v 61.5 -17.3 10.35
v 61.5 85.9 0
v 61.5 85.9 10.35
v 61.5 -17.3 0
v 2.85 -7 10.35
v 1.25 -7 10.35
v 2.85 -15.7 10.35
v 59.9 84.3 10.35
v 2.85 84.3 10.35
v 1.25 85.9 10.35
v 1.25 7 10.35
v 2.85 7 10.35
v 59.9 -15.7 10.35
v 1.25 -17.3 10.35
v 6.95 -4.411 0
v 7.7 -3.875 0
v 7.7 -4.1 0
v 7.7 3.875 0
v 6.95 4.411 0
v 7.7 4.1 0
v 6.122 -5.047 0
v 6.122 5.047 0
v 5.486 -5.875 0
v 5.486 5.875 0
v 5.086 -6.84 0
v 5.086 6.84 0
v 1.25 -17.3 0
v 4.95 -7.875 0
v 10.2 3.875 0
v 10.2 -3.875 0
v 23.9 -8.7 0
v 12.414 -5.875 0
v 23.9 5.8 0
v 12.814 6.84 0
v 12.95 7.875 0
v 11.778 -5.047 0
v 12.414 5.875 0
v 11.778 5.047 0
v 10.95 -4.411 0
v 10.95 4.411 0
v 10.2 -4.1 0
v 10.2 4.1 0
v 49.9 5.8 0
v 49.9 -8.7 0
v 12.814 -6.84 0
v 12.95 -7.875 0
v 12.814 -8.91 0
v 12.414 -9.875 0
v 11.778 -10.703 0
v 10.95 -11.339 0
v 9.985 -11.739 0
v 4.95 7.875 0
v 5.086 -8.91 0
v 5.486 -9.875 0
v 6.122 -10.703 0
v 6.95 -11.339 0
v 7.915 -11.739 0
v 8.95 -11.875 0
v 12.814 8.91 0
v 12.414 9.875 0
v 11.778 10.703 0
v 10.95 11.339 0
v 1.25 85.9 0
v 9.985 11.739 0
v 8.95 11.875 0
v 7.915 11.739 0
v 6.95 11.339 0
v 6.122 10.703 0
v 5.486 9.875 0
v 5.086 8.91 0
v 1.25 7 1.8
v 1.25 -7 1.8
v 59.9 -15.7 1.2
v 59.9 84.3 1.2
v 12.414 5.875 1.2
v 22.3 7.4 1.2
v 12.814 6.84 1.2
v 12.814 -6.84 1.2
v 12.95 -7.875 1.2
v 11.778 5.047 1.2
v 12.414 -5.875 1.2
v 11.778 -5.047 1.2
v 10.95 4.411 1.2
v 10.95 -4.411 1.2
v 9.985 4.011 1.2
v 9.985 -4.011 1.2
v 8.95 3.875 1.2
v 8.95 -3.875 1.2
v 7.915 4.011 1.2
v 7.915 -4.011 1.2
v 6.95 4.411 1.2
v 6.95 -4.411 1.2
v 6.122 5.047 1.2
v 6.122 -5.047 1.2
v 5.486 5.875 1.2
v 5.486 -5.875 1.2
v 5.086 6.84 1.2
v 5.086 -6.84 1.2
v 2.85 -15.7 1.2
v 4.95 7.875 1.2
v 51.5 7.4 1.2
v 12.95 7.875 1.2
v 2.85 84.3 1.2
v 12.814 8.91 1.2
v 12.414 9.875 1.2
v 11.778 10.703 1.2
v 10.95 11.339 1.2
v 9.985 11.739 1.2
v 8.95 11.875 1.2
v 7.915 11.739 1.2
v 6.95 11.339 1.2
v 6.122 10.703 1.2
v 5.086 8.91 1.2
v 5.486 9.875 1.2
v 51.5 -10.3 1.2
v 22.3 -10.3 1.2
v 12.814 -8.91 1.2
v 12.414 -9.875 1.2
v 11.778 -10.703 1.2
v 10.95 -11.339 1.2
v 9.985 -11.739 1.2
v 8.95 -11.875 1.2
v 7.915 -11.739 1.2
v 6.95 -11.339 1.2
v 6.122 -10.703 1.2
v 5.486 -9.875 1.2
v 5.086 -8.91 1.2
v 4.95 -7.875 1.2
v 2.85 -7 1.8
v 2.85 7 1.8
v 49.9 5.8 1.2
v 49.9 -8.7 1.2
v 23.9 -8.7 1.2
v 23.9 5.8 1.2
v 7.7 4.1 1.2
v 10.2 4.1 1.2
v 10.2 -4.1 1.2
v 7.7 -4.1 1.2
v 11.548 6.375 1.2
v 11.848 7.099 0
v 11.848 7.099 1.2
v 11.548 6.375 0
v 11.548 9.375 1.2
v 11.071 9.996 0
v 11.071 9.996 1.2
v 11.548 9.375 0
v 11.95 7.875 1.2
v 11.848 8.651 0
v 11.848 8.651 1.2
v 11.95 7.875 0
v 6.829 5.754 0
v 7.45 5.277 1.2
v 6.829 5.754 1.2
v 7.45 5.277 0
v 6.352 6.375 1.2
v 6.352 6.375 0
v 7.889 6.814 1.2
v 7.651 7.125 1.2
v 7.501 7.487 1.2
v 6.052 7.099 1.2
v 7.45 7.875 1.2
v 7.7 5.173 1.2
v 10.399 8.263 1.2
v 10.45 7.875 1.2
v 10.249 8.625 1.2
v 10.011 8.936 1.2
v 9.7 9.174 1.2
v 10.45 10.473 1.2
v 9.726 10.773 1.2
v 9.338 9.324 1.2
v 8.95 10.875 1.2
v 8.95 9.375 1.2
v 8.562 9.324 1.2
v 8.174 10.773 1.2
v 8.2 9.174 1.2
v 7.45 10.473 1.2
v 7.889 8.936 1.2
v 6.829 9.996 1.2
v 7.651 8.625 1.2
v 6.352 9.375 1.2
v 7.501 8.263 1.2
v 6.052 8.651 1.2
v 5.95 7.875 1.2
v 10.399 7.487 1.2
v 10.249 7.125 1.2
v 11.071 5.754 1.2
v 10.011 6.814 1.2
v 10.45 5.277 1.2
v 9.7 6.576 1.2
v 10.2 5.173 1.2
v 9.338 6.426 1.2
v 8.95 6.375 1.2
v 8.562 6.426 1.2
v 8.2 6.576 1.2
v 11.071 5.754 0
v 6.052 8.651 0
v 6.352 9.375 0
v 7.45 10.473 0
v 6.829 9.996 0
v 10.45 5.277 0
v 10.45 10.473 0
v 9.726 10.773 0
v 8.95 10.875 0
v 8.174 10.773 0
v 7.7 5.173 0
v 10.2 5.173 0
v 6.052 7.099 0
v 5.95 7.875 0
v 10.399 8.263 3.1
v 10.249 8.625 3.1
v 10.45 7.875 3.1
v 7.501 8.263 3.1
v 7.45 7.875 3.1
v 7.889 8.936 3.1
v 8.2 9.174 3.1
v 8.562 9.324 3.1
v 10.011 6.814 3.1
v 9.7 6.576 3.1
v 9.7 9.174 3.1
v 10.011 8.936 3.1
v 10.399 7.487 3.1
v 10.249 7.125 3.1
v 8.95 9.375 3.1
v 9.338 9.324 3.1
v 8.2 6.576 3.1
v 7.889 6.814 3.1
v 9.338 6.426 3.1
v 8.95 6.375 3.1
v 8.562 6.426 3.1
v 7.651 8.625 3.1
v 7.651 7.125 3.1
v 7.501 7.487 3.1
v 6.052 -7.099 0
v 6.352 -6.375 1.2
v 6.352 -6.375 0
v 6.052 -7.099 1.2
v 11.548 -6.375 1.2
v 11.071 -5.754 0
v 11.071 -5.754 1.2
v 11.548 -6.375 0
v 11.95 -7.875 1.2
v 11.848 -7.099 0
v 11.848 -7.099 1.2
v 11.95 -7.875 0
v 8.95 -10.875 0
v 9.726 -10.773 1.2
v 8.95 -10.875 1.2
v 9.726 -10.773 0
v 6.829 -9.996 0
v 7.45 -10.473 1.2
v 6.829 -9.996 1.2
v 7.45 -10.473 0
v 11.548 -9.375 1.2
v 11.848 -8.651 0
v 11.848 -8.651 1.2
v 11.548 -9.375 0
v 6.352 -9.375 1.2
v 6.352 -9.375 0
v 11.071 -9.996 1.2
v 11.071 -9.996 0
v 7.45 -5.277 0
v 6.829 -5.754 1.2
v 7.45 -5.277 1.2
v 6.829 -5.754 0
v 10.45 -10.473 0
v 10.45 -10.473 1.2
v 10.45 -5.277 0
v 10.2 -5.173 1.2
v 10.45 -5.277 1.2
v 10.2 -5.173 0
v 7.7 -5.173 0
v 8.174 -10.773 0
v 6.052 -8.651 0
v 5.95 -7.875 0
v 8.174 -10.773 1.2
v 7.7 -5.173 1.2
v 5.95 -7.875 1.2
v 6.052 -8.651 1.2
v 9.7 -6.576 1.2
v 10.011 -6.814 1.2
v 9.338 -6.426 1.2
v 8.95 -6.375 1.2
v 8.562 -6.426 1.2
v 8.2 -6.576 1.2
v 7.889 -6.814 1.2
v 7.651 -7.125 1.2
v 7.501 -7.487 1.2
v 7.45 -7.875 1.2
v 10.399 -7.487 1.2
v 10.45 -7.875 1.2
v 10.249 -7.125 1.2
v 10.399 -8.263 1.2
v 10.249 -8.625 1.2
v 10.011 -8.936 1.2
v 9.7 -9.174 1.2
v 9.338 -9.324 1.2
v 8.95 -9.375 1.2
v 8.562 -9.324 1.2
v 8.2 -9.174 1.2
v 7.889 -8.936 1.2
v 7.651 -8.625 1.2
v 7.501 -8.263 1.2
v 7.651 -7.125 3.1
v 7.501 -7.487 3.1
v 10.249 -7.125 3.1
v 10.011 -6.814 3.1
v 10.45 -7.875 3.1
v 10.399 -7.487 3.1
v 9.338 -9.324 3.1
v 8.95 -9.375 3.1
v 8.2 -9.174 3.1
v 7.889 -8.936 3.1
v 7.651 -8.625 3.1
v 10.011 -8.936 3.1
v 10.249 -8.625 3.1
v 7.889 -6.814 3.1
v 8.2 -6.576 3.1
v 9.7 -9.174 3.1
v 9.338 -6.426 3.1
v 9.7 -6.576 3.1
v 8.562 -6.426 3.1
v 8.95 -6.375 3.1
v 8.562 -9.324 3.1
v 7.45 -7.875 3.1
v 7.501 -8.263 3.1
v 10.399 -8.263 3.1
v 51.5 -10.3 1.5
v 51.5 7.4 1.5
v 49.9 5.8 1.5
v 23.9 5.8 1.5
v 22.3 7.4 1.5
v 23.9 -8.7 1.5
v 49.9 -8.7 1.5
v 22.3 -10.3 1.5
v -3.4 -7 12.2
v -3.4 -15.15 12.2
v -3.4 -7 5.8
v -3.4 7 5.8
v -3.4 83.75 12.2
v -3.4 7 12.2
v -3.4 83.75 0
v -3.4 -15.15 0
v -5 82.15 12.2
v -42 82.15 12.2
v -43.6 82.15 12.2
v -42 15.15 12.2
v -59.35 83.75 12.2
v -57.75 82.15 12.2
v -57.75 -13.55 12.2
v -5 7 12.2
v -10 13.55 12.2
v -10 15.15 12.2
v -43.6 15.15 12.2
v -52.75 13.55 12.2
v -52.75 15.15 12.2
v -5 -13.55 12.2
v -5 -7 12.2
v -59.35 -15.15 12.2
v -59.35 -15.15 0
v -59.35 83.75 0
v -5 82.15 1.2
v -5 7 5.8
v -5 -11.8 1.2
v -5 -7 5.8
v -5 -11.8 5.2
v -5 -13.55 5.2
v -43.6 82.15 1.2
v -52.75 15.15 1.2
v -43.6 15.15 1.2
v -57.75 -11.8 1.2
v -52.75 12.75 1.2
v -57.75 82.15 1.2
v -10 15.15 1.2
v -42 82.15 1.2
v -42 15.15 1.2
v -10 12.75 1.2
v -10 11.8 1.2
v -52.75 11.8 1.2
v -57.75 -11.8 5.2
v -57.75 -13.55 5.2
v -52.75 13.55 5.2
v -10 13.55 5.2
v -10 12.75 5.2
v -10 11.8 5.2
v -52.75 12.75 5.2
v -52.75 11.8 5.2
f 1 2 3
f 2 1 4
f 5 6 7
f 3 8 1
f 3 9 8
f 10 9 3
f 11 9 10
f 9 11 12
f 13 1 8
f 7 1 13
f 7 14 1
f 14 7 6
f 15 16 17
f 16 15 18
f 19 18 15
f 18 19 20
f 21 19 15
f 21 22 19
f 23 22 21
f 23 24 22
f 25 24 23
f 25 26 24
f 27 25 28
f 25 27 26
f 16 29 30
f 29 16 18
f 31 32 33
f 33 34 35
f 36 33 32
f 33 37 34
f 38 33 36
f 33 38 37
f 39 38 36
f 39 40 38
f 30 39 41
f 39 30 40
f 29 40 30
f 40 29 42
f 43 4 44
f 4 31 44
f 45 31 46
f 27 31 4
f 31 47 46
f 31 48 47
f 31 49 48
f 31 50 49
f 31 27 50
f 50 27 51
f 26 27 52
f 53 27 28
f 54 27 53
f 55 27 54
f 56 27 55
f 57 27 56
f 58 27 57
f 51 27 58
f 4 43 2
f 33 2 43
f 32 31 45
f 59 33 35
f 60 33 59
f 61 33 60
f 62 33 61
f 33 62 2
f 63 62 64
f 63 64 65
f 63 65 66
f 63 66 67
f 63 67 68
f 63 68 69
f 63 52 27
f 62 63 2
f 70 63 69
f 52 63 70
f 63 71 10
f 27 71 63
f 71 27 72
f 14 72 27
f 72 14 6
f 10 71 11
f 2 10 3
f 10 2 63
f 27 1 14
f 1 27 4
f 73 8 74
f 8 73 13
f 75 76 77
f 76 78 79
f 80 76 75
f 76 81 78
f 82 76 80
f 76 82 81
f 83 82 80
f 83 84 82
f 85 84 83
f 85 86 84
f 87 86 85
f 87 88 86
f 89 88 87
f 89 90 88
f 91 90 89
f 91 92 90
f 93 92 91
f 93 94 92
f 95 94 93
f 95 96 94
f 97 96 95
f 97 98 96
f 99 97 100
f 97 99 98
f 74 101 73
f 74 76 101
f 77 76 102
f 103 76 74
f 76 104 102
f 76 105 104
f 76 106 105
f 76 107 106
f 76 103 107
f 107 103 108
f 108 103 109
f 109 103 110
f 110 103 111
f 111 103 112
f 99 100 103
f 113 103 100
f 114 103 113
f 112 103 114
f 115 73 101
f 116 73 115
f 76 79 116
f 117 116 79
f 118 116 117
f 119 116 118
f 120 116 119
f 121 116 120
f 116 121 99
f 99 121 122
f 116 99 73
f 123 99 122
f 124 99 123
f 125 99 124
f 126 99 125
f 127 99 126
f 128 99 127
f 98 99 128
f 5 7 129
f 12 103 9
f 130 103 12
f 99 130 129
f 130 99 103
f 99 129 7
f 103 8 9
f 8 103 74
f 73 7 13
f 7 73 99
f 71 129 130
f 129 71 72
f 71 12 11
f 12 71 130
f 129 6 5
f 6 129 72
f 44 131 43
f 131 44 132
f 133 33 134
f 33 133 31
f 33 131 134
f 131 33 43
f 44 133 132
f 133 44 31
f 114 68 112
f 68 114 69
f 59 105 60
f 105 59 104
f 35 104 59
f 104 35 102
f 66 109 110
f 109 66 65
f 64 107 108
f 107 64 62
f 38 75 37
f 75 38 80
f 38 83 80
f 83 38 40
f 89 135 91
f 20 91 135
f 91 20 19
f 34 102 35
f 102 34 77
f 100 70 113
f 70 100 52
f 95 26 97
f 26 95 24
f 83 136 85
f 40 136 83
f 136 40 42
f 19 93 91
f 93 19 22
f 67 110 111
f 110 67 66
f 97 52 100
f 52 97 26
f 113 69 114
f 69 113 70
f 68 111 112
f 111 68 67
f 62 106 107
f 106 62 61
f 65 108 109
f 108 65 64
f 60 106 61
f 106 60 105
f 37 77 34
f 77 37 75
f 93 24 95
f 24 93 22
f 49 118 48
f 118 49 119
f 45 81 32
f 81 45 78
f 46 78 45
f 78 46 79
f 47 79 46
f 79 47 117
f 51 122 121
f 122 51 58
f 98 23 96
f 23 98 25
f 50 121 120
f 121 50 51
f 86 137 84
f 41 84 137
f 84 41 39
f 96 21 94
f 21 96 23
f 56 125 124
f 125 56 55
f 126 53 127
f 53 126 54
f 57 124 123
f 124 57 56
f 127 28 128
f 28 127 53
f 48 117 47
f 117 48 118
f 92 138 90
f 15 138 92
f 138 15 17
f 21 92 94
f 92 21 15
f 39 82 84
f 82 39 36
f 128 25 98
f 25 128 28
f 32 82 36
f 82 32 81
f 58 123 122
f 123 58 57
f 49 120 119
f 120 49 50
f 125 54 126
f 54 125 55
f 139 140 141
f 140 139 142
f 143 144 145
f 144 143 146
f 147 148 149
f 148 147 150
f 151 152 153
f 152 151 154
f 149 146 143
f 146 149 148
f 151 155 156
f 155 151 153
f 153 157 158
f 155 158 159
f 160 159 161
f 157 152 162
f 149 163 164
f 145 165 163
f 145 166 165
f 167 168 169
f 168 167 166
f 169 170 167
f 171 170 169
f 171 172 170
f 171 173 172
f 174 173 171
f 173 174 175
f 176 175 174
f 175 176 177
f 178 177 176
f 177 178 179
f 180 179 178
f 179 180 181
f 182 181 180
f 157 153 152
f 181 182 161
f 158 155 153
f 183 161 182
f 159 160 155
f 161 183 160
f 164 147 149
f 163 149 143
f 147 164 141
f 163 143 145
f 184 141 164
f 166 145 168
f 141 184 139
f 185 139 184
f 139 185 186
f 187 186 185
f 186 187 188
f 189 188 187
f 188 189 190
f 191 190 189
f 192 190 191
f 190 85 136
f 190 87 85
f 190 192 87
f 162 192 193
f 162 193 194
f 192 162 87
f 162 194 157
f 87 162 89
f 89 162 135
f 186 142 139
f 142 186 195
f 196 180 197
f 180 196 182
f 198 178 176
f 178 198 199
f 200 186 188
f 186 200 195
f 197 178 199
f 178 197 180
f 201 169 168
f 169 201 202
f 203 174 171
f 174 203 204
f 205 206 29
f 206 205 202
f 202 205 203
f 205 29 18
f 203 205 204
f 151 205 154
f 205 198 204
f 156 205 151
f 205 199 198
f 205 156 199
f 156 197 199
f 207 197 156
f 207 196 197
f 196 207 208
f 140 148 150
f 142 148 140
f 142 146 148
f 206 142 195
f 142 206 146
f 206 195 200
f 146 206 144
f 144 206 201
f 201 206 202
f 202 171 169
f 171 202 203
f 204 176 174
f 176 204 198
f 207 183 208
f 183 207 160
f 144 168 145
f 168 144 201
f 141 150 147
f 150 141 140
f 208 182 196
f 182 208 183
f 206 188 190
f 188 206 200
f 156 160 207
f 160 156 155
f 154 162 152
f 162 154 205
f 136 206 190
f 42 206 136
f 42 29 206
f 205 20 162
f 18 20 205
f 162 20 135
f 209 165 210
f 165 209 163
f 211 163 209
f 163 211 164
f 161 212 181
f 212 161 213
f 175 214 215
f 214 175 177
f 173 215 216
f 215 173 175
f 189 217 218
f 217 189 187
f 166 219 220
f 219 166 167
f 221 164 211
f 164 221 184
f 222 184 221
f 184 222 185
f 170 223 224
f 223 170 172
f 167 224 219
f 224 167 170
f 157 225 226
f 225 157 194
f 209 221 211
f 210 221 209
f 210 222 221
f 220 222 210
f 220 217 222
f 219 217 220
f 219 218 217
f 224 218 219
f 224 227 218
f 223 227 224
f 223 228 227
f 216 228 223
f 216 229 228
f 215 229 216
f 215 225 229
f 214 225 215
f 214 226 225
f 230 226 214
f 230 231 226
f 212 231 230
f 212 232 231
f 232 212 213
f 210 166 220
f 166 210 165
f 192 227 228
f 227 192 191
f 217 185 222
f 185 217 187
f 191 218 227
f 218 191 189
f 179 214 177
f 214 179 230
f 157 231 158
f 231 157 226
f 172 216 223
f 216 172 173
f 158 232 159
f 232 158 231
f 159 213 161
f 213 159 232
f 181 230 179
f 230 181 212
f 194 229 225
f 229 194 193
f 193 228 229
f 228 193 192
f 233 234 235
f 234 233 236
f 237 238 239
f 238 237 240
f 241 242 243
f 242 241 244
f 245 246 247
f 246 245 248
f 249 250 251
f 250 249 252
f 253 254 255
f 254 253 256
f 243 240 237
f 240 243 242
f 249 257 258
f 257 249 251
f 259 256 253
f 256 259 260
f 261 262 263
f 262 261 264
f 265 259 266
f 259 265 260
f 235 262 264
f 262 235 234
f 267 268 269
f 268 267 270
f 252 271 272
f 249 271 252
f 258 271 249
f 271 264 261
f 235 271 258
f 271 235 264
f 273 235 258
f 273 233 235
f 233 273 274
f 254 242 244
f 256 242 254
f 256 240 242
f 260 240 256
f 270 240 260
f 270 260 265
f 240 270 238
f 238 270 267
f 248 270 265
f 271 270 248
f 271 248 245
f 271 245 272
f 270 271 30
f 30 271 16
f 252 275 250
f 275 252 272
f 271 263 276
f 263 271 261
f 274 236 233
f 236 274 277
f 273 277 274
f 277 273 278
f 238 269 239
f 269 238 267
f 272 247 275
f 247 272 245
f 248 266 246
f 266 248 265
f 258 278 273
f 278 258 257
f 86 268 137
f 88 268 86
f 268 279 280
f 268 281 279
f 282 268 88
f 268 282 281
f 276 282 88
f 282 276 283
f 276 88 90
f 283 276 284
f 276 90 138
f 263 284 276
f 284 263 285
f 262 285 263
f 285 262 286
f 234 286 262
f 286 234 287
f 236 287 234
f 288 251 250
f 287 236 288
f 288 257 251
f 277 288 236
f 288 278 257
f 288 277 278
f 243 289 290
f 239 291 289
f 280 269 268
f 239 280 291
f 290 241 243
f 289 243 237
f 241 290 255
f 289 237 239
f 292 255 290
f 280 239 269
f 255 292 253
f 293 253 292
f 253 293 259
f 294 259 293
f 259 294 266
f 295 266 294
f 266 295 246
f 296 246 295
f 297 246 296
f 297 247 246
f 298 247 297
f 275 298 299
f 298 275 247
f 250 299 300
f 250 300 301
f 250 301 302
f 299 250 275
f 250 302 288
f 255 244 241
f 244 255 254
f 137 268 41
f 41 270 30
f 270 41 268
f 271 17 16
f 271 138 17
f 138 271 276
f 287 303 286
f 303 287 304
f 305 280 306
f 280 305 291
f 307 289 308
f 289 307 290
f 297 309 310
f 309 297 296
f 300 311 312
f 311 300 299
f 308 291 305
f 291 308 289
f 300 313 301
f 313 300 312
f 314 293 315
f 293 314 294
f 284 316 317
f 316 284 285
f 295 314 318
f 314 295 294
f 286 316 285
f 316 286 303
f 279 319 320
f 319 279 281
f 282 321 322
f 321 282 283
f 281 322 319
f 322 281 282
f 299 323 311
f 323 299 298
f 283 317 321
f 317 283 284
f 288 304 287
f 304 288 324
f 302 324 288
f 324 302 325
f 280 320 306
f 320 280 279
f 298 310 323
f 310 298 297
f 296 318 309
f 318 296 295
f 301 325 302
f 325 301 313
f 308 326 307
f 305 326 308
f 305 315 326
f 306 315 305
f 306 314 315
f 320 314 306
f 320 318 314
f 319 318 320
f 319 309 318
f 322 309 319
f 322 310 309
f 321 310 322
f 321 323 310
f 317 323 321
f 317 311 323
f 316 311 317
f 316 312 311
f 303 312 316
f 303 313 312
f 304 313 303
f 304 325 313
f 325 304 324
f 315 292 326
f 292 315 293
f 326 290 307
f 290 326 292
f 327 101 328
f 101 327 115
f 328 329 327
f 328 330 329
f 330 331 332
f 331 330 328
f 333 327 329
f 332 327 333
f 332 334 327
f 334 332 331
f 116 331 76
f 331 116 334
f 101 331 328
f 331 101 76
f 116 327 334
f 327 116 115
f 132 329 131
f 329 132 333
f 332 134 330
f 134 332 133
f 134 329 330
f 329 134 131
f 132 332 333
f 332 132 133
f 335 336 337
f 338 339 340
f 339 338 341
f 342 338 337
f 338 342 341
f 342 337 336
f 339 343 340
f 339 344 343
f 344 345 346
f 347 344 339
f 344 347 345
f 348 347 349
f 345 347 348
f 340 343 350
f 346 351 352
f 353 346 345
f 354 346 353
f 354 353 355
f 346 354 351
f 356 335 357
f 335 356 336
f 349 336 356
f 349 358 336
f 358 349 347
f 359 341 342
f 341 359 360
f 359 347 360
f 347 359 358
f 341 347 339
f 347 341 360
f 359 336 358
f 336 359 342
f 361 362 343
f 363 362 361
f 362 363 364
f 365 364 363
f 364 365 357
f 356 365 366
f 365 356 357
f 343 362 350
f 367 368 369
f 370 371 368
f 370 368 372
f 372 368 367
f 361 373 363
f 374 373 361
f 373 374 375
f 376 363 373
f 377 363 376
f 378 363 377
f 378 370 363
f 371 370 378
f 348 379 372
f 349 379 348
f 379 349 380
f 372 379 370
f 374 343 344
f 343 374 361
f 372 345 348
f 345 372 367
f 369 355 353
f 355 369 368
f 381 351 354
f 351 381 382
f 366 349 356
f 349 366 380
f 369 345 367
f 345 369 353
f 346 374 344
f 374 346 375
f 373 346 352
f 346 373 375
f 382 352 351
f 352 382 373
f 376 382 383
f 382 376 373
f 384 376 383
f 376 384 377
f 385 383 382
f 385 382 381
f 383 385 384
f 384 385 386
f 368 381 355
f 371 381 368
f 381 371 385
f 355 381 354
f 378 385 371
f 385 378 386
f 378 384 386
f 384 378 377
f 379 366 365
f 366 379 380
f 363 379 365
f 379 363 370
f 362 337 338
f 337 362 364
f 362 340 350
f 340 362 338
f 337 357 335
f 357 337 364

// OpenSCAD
battery_length = 67;
battery_width = 37;

board_length = 52.75;
board_width = 27.1;

wall_thickness = 1.6;
inner_height = 11;
floor_thickness = 1.2;
board_support_height=4;
board_support_width=1.75;

slot_width = 5;
port_width = 14;
port_height = 0;

top_height = (inner_height + floor_thickness) * 0.75;
top_tolerance = 0.55;

screen_width = 26.0;
screen_height = 14.5;
screen_y_offset = 7.0;
screen_x_offset = 10;
screen_border_thickness = 0.2;

button_spacing = 15.75;
button_depth = 1.3;
button_width = 6;
button_inset = 5;

// choose the part to print
bottom = true;
top = true;

$fn=24;

if (top) {
  translate([board_length / 2 + 5 , 0, (top_height+floor_thickness)/2]) {
    difference() {
      translate([0,(battery_length+wall_thickness)/2,0]) {
        box(
            board_length+2*wall_thickness+2*top_tolerance,
            board_width+battery_length+wall_thickness+2*wall_thickness+2*top_tolerance,
            top_height);
      }
      // cut port
      translate([
          -(board_length+3*wall_thickness)/2-top_tolerance,
          0,
          floor_thickness]) {
        cube([wall_thickness*2, port_width, top_height], center=true);
      }

      // cut screen
      translate([
          (board_length+2*wall_thickness-screen_width)/2+top_tolerance-screen_x_offset,
          -(board_width+2*wall_thickness-screen_height)/2-top_tolerance+screen_y_offset,
          -(top_height)/2]) {
        cube([screen_width, screen_height, 2 * floor_thickness], center=true);
      }

      // cut buttons
      translate([
          -(board_length+2*wall_thickness)/2+top_tolerance+button_inset,
          (button_spacing)/2,
          -(top_height)/2]) {
        cylinder(d=button_width+2,h=2*floor_thickness, center=true);
      }
      translate([
          -(board_length+2*wall_thickness)/2+top_tolerance+button_inset,
          -(button_spacing)/2,
          -(top_height)/2]) {
        cylinder(d=button_width+2,h=2*floor_thickness, center=true);
      }
    }

    // buttons
    translate([
        -(board_length+2*wall_thickness)/2+top_tolerance+button_inset,
        (button_spacing)/2,
        -(top_height)/2]) {
      cylinder(d=button_width,h=floor_thickness, center=true);
      translate([0,-button_width/2,0]) {
        cube([2.5,2,floor_thickness], center=true);
      }
      translate([0,0,(button_depth+floor_thickness)/2]) {
        cylinder(d=button_width/2,h=floor_thickness+button_depth, center=true);
      }
    }
    translate([
        -(board_length+2*wall_thickness)/2+top_tolerance+button_inset,
        -(button_spacing)/2,
        -(top_height)/2]) {
      cylinder(d=button_width,h=floor_thickness, center=true);
      translate([0,button_width/2,0]) {
        cube([2.5,2,floor_thickness], center=true);
      }
      translate([0,0,(button_depth+floor_thickness)/2]) {
        cylinder(d=button_width/2,h=floor_thickness+button_depth, center=true);
      }
    }

    // screen border
    translate([
        (board_length+2*wall_thickness-screen_width)/2+top_tolerance-screen_x_offset,
        -(board_width+2*wall_thickness-screen_height)/2-top_tolerance+screen_y_offset,
        -(top_height)/2 + screen_border_thickness]) {
      difference() {
        border_height = floor_thickness + screen_border_thickness;
        cube([screen_width + 2 * wall_thickness,
              screen_height + 2 * wall_thickness,
              border_height],
             center=true);
        cube([screen_width,
              screen_height,
              border_height + 0.1],
             center=true);
      }
    }
  }
}

if (bottom) {
  translate([-board_length / 2 - 5, 0, (inner_height+floor_thickness)/2]) {
    difference() {
      union() {
        // outer wall
        translate([0,(battery_length+wall_thickness)/2,0]) {
          box(
              board_length,
              board_width+battery_length+wall_thickness,
              inner_height);
        }

        // board box
        box(board_length, board_width, inner_height);

        // board support
        translate([
                  0,
                  (board_width-board_support_width)/2,
                  -(inner_height-board_support_height-floor_thickness)/2]) {
          cube([board_length-2*slot_width, board_support_width,board_support_height], center=true);
        }
        translate([
                  0,
                  -(board_width-board_support_width)/2,
                  -(inner_height-board_support_height-floor_thickness)/2]) {
          cube([board_length, board_support_width,board_support_height], center=true);
        }


        // battery box
        translate([(
                    board_length-battery_width)/2,
                  (battery_length+board_width)/2+wall_thickness,
                  0]) {
          box(battery_width, battery_length, inner_height);
        }
      }

      // cut wiring slots
      translate([
        (board_length-slot_width)/2,
        (board_width+wall_thickness)/2,
        floor_thickness]) {
      cube([
            slot_width,
            2*wall_thickness,
            inner_height+floor_thickness],
          center = true);
      }

      translate([
              -(board_length-slot_width)/2,
              (board_width+wall_thickness)/2,
                floor_thickness]) {
        cube([
              slot_width,
              2*wall_thickness,
              inner_height+floor_thickness],
            center = true);
      }

      // cut port
      translate([
              (board_length+wall_thickness)/2,
              0,
              floor_thickness+port_height+board_support_height]) {
        cube([wall_thickness*2, port_width, inner_height], center=true);
      }
    }
  }
}

module box(inner_width, inner_length, inner_height) {
  difference() {
    cube([
          inner_width+2*wall_thickness,
          inner_length+2*wall_thickness,
          inner_height+floor_thickness],
         center = true);
    translate([0, 0, floor_thickness]) {
      cube([
            inner_width,
            inner_length,
            inner_height+floor_thickness],
           center = true);
    }
  }
}
